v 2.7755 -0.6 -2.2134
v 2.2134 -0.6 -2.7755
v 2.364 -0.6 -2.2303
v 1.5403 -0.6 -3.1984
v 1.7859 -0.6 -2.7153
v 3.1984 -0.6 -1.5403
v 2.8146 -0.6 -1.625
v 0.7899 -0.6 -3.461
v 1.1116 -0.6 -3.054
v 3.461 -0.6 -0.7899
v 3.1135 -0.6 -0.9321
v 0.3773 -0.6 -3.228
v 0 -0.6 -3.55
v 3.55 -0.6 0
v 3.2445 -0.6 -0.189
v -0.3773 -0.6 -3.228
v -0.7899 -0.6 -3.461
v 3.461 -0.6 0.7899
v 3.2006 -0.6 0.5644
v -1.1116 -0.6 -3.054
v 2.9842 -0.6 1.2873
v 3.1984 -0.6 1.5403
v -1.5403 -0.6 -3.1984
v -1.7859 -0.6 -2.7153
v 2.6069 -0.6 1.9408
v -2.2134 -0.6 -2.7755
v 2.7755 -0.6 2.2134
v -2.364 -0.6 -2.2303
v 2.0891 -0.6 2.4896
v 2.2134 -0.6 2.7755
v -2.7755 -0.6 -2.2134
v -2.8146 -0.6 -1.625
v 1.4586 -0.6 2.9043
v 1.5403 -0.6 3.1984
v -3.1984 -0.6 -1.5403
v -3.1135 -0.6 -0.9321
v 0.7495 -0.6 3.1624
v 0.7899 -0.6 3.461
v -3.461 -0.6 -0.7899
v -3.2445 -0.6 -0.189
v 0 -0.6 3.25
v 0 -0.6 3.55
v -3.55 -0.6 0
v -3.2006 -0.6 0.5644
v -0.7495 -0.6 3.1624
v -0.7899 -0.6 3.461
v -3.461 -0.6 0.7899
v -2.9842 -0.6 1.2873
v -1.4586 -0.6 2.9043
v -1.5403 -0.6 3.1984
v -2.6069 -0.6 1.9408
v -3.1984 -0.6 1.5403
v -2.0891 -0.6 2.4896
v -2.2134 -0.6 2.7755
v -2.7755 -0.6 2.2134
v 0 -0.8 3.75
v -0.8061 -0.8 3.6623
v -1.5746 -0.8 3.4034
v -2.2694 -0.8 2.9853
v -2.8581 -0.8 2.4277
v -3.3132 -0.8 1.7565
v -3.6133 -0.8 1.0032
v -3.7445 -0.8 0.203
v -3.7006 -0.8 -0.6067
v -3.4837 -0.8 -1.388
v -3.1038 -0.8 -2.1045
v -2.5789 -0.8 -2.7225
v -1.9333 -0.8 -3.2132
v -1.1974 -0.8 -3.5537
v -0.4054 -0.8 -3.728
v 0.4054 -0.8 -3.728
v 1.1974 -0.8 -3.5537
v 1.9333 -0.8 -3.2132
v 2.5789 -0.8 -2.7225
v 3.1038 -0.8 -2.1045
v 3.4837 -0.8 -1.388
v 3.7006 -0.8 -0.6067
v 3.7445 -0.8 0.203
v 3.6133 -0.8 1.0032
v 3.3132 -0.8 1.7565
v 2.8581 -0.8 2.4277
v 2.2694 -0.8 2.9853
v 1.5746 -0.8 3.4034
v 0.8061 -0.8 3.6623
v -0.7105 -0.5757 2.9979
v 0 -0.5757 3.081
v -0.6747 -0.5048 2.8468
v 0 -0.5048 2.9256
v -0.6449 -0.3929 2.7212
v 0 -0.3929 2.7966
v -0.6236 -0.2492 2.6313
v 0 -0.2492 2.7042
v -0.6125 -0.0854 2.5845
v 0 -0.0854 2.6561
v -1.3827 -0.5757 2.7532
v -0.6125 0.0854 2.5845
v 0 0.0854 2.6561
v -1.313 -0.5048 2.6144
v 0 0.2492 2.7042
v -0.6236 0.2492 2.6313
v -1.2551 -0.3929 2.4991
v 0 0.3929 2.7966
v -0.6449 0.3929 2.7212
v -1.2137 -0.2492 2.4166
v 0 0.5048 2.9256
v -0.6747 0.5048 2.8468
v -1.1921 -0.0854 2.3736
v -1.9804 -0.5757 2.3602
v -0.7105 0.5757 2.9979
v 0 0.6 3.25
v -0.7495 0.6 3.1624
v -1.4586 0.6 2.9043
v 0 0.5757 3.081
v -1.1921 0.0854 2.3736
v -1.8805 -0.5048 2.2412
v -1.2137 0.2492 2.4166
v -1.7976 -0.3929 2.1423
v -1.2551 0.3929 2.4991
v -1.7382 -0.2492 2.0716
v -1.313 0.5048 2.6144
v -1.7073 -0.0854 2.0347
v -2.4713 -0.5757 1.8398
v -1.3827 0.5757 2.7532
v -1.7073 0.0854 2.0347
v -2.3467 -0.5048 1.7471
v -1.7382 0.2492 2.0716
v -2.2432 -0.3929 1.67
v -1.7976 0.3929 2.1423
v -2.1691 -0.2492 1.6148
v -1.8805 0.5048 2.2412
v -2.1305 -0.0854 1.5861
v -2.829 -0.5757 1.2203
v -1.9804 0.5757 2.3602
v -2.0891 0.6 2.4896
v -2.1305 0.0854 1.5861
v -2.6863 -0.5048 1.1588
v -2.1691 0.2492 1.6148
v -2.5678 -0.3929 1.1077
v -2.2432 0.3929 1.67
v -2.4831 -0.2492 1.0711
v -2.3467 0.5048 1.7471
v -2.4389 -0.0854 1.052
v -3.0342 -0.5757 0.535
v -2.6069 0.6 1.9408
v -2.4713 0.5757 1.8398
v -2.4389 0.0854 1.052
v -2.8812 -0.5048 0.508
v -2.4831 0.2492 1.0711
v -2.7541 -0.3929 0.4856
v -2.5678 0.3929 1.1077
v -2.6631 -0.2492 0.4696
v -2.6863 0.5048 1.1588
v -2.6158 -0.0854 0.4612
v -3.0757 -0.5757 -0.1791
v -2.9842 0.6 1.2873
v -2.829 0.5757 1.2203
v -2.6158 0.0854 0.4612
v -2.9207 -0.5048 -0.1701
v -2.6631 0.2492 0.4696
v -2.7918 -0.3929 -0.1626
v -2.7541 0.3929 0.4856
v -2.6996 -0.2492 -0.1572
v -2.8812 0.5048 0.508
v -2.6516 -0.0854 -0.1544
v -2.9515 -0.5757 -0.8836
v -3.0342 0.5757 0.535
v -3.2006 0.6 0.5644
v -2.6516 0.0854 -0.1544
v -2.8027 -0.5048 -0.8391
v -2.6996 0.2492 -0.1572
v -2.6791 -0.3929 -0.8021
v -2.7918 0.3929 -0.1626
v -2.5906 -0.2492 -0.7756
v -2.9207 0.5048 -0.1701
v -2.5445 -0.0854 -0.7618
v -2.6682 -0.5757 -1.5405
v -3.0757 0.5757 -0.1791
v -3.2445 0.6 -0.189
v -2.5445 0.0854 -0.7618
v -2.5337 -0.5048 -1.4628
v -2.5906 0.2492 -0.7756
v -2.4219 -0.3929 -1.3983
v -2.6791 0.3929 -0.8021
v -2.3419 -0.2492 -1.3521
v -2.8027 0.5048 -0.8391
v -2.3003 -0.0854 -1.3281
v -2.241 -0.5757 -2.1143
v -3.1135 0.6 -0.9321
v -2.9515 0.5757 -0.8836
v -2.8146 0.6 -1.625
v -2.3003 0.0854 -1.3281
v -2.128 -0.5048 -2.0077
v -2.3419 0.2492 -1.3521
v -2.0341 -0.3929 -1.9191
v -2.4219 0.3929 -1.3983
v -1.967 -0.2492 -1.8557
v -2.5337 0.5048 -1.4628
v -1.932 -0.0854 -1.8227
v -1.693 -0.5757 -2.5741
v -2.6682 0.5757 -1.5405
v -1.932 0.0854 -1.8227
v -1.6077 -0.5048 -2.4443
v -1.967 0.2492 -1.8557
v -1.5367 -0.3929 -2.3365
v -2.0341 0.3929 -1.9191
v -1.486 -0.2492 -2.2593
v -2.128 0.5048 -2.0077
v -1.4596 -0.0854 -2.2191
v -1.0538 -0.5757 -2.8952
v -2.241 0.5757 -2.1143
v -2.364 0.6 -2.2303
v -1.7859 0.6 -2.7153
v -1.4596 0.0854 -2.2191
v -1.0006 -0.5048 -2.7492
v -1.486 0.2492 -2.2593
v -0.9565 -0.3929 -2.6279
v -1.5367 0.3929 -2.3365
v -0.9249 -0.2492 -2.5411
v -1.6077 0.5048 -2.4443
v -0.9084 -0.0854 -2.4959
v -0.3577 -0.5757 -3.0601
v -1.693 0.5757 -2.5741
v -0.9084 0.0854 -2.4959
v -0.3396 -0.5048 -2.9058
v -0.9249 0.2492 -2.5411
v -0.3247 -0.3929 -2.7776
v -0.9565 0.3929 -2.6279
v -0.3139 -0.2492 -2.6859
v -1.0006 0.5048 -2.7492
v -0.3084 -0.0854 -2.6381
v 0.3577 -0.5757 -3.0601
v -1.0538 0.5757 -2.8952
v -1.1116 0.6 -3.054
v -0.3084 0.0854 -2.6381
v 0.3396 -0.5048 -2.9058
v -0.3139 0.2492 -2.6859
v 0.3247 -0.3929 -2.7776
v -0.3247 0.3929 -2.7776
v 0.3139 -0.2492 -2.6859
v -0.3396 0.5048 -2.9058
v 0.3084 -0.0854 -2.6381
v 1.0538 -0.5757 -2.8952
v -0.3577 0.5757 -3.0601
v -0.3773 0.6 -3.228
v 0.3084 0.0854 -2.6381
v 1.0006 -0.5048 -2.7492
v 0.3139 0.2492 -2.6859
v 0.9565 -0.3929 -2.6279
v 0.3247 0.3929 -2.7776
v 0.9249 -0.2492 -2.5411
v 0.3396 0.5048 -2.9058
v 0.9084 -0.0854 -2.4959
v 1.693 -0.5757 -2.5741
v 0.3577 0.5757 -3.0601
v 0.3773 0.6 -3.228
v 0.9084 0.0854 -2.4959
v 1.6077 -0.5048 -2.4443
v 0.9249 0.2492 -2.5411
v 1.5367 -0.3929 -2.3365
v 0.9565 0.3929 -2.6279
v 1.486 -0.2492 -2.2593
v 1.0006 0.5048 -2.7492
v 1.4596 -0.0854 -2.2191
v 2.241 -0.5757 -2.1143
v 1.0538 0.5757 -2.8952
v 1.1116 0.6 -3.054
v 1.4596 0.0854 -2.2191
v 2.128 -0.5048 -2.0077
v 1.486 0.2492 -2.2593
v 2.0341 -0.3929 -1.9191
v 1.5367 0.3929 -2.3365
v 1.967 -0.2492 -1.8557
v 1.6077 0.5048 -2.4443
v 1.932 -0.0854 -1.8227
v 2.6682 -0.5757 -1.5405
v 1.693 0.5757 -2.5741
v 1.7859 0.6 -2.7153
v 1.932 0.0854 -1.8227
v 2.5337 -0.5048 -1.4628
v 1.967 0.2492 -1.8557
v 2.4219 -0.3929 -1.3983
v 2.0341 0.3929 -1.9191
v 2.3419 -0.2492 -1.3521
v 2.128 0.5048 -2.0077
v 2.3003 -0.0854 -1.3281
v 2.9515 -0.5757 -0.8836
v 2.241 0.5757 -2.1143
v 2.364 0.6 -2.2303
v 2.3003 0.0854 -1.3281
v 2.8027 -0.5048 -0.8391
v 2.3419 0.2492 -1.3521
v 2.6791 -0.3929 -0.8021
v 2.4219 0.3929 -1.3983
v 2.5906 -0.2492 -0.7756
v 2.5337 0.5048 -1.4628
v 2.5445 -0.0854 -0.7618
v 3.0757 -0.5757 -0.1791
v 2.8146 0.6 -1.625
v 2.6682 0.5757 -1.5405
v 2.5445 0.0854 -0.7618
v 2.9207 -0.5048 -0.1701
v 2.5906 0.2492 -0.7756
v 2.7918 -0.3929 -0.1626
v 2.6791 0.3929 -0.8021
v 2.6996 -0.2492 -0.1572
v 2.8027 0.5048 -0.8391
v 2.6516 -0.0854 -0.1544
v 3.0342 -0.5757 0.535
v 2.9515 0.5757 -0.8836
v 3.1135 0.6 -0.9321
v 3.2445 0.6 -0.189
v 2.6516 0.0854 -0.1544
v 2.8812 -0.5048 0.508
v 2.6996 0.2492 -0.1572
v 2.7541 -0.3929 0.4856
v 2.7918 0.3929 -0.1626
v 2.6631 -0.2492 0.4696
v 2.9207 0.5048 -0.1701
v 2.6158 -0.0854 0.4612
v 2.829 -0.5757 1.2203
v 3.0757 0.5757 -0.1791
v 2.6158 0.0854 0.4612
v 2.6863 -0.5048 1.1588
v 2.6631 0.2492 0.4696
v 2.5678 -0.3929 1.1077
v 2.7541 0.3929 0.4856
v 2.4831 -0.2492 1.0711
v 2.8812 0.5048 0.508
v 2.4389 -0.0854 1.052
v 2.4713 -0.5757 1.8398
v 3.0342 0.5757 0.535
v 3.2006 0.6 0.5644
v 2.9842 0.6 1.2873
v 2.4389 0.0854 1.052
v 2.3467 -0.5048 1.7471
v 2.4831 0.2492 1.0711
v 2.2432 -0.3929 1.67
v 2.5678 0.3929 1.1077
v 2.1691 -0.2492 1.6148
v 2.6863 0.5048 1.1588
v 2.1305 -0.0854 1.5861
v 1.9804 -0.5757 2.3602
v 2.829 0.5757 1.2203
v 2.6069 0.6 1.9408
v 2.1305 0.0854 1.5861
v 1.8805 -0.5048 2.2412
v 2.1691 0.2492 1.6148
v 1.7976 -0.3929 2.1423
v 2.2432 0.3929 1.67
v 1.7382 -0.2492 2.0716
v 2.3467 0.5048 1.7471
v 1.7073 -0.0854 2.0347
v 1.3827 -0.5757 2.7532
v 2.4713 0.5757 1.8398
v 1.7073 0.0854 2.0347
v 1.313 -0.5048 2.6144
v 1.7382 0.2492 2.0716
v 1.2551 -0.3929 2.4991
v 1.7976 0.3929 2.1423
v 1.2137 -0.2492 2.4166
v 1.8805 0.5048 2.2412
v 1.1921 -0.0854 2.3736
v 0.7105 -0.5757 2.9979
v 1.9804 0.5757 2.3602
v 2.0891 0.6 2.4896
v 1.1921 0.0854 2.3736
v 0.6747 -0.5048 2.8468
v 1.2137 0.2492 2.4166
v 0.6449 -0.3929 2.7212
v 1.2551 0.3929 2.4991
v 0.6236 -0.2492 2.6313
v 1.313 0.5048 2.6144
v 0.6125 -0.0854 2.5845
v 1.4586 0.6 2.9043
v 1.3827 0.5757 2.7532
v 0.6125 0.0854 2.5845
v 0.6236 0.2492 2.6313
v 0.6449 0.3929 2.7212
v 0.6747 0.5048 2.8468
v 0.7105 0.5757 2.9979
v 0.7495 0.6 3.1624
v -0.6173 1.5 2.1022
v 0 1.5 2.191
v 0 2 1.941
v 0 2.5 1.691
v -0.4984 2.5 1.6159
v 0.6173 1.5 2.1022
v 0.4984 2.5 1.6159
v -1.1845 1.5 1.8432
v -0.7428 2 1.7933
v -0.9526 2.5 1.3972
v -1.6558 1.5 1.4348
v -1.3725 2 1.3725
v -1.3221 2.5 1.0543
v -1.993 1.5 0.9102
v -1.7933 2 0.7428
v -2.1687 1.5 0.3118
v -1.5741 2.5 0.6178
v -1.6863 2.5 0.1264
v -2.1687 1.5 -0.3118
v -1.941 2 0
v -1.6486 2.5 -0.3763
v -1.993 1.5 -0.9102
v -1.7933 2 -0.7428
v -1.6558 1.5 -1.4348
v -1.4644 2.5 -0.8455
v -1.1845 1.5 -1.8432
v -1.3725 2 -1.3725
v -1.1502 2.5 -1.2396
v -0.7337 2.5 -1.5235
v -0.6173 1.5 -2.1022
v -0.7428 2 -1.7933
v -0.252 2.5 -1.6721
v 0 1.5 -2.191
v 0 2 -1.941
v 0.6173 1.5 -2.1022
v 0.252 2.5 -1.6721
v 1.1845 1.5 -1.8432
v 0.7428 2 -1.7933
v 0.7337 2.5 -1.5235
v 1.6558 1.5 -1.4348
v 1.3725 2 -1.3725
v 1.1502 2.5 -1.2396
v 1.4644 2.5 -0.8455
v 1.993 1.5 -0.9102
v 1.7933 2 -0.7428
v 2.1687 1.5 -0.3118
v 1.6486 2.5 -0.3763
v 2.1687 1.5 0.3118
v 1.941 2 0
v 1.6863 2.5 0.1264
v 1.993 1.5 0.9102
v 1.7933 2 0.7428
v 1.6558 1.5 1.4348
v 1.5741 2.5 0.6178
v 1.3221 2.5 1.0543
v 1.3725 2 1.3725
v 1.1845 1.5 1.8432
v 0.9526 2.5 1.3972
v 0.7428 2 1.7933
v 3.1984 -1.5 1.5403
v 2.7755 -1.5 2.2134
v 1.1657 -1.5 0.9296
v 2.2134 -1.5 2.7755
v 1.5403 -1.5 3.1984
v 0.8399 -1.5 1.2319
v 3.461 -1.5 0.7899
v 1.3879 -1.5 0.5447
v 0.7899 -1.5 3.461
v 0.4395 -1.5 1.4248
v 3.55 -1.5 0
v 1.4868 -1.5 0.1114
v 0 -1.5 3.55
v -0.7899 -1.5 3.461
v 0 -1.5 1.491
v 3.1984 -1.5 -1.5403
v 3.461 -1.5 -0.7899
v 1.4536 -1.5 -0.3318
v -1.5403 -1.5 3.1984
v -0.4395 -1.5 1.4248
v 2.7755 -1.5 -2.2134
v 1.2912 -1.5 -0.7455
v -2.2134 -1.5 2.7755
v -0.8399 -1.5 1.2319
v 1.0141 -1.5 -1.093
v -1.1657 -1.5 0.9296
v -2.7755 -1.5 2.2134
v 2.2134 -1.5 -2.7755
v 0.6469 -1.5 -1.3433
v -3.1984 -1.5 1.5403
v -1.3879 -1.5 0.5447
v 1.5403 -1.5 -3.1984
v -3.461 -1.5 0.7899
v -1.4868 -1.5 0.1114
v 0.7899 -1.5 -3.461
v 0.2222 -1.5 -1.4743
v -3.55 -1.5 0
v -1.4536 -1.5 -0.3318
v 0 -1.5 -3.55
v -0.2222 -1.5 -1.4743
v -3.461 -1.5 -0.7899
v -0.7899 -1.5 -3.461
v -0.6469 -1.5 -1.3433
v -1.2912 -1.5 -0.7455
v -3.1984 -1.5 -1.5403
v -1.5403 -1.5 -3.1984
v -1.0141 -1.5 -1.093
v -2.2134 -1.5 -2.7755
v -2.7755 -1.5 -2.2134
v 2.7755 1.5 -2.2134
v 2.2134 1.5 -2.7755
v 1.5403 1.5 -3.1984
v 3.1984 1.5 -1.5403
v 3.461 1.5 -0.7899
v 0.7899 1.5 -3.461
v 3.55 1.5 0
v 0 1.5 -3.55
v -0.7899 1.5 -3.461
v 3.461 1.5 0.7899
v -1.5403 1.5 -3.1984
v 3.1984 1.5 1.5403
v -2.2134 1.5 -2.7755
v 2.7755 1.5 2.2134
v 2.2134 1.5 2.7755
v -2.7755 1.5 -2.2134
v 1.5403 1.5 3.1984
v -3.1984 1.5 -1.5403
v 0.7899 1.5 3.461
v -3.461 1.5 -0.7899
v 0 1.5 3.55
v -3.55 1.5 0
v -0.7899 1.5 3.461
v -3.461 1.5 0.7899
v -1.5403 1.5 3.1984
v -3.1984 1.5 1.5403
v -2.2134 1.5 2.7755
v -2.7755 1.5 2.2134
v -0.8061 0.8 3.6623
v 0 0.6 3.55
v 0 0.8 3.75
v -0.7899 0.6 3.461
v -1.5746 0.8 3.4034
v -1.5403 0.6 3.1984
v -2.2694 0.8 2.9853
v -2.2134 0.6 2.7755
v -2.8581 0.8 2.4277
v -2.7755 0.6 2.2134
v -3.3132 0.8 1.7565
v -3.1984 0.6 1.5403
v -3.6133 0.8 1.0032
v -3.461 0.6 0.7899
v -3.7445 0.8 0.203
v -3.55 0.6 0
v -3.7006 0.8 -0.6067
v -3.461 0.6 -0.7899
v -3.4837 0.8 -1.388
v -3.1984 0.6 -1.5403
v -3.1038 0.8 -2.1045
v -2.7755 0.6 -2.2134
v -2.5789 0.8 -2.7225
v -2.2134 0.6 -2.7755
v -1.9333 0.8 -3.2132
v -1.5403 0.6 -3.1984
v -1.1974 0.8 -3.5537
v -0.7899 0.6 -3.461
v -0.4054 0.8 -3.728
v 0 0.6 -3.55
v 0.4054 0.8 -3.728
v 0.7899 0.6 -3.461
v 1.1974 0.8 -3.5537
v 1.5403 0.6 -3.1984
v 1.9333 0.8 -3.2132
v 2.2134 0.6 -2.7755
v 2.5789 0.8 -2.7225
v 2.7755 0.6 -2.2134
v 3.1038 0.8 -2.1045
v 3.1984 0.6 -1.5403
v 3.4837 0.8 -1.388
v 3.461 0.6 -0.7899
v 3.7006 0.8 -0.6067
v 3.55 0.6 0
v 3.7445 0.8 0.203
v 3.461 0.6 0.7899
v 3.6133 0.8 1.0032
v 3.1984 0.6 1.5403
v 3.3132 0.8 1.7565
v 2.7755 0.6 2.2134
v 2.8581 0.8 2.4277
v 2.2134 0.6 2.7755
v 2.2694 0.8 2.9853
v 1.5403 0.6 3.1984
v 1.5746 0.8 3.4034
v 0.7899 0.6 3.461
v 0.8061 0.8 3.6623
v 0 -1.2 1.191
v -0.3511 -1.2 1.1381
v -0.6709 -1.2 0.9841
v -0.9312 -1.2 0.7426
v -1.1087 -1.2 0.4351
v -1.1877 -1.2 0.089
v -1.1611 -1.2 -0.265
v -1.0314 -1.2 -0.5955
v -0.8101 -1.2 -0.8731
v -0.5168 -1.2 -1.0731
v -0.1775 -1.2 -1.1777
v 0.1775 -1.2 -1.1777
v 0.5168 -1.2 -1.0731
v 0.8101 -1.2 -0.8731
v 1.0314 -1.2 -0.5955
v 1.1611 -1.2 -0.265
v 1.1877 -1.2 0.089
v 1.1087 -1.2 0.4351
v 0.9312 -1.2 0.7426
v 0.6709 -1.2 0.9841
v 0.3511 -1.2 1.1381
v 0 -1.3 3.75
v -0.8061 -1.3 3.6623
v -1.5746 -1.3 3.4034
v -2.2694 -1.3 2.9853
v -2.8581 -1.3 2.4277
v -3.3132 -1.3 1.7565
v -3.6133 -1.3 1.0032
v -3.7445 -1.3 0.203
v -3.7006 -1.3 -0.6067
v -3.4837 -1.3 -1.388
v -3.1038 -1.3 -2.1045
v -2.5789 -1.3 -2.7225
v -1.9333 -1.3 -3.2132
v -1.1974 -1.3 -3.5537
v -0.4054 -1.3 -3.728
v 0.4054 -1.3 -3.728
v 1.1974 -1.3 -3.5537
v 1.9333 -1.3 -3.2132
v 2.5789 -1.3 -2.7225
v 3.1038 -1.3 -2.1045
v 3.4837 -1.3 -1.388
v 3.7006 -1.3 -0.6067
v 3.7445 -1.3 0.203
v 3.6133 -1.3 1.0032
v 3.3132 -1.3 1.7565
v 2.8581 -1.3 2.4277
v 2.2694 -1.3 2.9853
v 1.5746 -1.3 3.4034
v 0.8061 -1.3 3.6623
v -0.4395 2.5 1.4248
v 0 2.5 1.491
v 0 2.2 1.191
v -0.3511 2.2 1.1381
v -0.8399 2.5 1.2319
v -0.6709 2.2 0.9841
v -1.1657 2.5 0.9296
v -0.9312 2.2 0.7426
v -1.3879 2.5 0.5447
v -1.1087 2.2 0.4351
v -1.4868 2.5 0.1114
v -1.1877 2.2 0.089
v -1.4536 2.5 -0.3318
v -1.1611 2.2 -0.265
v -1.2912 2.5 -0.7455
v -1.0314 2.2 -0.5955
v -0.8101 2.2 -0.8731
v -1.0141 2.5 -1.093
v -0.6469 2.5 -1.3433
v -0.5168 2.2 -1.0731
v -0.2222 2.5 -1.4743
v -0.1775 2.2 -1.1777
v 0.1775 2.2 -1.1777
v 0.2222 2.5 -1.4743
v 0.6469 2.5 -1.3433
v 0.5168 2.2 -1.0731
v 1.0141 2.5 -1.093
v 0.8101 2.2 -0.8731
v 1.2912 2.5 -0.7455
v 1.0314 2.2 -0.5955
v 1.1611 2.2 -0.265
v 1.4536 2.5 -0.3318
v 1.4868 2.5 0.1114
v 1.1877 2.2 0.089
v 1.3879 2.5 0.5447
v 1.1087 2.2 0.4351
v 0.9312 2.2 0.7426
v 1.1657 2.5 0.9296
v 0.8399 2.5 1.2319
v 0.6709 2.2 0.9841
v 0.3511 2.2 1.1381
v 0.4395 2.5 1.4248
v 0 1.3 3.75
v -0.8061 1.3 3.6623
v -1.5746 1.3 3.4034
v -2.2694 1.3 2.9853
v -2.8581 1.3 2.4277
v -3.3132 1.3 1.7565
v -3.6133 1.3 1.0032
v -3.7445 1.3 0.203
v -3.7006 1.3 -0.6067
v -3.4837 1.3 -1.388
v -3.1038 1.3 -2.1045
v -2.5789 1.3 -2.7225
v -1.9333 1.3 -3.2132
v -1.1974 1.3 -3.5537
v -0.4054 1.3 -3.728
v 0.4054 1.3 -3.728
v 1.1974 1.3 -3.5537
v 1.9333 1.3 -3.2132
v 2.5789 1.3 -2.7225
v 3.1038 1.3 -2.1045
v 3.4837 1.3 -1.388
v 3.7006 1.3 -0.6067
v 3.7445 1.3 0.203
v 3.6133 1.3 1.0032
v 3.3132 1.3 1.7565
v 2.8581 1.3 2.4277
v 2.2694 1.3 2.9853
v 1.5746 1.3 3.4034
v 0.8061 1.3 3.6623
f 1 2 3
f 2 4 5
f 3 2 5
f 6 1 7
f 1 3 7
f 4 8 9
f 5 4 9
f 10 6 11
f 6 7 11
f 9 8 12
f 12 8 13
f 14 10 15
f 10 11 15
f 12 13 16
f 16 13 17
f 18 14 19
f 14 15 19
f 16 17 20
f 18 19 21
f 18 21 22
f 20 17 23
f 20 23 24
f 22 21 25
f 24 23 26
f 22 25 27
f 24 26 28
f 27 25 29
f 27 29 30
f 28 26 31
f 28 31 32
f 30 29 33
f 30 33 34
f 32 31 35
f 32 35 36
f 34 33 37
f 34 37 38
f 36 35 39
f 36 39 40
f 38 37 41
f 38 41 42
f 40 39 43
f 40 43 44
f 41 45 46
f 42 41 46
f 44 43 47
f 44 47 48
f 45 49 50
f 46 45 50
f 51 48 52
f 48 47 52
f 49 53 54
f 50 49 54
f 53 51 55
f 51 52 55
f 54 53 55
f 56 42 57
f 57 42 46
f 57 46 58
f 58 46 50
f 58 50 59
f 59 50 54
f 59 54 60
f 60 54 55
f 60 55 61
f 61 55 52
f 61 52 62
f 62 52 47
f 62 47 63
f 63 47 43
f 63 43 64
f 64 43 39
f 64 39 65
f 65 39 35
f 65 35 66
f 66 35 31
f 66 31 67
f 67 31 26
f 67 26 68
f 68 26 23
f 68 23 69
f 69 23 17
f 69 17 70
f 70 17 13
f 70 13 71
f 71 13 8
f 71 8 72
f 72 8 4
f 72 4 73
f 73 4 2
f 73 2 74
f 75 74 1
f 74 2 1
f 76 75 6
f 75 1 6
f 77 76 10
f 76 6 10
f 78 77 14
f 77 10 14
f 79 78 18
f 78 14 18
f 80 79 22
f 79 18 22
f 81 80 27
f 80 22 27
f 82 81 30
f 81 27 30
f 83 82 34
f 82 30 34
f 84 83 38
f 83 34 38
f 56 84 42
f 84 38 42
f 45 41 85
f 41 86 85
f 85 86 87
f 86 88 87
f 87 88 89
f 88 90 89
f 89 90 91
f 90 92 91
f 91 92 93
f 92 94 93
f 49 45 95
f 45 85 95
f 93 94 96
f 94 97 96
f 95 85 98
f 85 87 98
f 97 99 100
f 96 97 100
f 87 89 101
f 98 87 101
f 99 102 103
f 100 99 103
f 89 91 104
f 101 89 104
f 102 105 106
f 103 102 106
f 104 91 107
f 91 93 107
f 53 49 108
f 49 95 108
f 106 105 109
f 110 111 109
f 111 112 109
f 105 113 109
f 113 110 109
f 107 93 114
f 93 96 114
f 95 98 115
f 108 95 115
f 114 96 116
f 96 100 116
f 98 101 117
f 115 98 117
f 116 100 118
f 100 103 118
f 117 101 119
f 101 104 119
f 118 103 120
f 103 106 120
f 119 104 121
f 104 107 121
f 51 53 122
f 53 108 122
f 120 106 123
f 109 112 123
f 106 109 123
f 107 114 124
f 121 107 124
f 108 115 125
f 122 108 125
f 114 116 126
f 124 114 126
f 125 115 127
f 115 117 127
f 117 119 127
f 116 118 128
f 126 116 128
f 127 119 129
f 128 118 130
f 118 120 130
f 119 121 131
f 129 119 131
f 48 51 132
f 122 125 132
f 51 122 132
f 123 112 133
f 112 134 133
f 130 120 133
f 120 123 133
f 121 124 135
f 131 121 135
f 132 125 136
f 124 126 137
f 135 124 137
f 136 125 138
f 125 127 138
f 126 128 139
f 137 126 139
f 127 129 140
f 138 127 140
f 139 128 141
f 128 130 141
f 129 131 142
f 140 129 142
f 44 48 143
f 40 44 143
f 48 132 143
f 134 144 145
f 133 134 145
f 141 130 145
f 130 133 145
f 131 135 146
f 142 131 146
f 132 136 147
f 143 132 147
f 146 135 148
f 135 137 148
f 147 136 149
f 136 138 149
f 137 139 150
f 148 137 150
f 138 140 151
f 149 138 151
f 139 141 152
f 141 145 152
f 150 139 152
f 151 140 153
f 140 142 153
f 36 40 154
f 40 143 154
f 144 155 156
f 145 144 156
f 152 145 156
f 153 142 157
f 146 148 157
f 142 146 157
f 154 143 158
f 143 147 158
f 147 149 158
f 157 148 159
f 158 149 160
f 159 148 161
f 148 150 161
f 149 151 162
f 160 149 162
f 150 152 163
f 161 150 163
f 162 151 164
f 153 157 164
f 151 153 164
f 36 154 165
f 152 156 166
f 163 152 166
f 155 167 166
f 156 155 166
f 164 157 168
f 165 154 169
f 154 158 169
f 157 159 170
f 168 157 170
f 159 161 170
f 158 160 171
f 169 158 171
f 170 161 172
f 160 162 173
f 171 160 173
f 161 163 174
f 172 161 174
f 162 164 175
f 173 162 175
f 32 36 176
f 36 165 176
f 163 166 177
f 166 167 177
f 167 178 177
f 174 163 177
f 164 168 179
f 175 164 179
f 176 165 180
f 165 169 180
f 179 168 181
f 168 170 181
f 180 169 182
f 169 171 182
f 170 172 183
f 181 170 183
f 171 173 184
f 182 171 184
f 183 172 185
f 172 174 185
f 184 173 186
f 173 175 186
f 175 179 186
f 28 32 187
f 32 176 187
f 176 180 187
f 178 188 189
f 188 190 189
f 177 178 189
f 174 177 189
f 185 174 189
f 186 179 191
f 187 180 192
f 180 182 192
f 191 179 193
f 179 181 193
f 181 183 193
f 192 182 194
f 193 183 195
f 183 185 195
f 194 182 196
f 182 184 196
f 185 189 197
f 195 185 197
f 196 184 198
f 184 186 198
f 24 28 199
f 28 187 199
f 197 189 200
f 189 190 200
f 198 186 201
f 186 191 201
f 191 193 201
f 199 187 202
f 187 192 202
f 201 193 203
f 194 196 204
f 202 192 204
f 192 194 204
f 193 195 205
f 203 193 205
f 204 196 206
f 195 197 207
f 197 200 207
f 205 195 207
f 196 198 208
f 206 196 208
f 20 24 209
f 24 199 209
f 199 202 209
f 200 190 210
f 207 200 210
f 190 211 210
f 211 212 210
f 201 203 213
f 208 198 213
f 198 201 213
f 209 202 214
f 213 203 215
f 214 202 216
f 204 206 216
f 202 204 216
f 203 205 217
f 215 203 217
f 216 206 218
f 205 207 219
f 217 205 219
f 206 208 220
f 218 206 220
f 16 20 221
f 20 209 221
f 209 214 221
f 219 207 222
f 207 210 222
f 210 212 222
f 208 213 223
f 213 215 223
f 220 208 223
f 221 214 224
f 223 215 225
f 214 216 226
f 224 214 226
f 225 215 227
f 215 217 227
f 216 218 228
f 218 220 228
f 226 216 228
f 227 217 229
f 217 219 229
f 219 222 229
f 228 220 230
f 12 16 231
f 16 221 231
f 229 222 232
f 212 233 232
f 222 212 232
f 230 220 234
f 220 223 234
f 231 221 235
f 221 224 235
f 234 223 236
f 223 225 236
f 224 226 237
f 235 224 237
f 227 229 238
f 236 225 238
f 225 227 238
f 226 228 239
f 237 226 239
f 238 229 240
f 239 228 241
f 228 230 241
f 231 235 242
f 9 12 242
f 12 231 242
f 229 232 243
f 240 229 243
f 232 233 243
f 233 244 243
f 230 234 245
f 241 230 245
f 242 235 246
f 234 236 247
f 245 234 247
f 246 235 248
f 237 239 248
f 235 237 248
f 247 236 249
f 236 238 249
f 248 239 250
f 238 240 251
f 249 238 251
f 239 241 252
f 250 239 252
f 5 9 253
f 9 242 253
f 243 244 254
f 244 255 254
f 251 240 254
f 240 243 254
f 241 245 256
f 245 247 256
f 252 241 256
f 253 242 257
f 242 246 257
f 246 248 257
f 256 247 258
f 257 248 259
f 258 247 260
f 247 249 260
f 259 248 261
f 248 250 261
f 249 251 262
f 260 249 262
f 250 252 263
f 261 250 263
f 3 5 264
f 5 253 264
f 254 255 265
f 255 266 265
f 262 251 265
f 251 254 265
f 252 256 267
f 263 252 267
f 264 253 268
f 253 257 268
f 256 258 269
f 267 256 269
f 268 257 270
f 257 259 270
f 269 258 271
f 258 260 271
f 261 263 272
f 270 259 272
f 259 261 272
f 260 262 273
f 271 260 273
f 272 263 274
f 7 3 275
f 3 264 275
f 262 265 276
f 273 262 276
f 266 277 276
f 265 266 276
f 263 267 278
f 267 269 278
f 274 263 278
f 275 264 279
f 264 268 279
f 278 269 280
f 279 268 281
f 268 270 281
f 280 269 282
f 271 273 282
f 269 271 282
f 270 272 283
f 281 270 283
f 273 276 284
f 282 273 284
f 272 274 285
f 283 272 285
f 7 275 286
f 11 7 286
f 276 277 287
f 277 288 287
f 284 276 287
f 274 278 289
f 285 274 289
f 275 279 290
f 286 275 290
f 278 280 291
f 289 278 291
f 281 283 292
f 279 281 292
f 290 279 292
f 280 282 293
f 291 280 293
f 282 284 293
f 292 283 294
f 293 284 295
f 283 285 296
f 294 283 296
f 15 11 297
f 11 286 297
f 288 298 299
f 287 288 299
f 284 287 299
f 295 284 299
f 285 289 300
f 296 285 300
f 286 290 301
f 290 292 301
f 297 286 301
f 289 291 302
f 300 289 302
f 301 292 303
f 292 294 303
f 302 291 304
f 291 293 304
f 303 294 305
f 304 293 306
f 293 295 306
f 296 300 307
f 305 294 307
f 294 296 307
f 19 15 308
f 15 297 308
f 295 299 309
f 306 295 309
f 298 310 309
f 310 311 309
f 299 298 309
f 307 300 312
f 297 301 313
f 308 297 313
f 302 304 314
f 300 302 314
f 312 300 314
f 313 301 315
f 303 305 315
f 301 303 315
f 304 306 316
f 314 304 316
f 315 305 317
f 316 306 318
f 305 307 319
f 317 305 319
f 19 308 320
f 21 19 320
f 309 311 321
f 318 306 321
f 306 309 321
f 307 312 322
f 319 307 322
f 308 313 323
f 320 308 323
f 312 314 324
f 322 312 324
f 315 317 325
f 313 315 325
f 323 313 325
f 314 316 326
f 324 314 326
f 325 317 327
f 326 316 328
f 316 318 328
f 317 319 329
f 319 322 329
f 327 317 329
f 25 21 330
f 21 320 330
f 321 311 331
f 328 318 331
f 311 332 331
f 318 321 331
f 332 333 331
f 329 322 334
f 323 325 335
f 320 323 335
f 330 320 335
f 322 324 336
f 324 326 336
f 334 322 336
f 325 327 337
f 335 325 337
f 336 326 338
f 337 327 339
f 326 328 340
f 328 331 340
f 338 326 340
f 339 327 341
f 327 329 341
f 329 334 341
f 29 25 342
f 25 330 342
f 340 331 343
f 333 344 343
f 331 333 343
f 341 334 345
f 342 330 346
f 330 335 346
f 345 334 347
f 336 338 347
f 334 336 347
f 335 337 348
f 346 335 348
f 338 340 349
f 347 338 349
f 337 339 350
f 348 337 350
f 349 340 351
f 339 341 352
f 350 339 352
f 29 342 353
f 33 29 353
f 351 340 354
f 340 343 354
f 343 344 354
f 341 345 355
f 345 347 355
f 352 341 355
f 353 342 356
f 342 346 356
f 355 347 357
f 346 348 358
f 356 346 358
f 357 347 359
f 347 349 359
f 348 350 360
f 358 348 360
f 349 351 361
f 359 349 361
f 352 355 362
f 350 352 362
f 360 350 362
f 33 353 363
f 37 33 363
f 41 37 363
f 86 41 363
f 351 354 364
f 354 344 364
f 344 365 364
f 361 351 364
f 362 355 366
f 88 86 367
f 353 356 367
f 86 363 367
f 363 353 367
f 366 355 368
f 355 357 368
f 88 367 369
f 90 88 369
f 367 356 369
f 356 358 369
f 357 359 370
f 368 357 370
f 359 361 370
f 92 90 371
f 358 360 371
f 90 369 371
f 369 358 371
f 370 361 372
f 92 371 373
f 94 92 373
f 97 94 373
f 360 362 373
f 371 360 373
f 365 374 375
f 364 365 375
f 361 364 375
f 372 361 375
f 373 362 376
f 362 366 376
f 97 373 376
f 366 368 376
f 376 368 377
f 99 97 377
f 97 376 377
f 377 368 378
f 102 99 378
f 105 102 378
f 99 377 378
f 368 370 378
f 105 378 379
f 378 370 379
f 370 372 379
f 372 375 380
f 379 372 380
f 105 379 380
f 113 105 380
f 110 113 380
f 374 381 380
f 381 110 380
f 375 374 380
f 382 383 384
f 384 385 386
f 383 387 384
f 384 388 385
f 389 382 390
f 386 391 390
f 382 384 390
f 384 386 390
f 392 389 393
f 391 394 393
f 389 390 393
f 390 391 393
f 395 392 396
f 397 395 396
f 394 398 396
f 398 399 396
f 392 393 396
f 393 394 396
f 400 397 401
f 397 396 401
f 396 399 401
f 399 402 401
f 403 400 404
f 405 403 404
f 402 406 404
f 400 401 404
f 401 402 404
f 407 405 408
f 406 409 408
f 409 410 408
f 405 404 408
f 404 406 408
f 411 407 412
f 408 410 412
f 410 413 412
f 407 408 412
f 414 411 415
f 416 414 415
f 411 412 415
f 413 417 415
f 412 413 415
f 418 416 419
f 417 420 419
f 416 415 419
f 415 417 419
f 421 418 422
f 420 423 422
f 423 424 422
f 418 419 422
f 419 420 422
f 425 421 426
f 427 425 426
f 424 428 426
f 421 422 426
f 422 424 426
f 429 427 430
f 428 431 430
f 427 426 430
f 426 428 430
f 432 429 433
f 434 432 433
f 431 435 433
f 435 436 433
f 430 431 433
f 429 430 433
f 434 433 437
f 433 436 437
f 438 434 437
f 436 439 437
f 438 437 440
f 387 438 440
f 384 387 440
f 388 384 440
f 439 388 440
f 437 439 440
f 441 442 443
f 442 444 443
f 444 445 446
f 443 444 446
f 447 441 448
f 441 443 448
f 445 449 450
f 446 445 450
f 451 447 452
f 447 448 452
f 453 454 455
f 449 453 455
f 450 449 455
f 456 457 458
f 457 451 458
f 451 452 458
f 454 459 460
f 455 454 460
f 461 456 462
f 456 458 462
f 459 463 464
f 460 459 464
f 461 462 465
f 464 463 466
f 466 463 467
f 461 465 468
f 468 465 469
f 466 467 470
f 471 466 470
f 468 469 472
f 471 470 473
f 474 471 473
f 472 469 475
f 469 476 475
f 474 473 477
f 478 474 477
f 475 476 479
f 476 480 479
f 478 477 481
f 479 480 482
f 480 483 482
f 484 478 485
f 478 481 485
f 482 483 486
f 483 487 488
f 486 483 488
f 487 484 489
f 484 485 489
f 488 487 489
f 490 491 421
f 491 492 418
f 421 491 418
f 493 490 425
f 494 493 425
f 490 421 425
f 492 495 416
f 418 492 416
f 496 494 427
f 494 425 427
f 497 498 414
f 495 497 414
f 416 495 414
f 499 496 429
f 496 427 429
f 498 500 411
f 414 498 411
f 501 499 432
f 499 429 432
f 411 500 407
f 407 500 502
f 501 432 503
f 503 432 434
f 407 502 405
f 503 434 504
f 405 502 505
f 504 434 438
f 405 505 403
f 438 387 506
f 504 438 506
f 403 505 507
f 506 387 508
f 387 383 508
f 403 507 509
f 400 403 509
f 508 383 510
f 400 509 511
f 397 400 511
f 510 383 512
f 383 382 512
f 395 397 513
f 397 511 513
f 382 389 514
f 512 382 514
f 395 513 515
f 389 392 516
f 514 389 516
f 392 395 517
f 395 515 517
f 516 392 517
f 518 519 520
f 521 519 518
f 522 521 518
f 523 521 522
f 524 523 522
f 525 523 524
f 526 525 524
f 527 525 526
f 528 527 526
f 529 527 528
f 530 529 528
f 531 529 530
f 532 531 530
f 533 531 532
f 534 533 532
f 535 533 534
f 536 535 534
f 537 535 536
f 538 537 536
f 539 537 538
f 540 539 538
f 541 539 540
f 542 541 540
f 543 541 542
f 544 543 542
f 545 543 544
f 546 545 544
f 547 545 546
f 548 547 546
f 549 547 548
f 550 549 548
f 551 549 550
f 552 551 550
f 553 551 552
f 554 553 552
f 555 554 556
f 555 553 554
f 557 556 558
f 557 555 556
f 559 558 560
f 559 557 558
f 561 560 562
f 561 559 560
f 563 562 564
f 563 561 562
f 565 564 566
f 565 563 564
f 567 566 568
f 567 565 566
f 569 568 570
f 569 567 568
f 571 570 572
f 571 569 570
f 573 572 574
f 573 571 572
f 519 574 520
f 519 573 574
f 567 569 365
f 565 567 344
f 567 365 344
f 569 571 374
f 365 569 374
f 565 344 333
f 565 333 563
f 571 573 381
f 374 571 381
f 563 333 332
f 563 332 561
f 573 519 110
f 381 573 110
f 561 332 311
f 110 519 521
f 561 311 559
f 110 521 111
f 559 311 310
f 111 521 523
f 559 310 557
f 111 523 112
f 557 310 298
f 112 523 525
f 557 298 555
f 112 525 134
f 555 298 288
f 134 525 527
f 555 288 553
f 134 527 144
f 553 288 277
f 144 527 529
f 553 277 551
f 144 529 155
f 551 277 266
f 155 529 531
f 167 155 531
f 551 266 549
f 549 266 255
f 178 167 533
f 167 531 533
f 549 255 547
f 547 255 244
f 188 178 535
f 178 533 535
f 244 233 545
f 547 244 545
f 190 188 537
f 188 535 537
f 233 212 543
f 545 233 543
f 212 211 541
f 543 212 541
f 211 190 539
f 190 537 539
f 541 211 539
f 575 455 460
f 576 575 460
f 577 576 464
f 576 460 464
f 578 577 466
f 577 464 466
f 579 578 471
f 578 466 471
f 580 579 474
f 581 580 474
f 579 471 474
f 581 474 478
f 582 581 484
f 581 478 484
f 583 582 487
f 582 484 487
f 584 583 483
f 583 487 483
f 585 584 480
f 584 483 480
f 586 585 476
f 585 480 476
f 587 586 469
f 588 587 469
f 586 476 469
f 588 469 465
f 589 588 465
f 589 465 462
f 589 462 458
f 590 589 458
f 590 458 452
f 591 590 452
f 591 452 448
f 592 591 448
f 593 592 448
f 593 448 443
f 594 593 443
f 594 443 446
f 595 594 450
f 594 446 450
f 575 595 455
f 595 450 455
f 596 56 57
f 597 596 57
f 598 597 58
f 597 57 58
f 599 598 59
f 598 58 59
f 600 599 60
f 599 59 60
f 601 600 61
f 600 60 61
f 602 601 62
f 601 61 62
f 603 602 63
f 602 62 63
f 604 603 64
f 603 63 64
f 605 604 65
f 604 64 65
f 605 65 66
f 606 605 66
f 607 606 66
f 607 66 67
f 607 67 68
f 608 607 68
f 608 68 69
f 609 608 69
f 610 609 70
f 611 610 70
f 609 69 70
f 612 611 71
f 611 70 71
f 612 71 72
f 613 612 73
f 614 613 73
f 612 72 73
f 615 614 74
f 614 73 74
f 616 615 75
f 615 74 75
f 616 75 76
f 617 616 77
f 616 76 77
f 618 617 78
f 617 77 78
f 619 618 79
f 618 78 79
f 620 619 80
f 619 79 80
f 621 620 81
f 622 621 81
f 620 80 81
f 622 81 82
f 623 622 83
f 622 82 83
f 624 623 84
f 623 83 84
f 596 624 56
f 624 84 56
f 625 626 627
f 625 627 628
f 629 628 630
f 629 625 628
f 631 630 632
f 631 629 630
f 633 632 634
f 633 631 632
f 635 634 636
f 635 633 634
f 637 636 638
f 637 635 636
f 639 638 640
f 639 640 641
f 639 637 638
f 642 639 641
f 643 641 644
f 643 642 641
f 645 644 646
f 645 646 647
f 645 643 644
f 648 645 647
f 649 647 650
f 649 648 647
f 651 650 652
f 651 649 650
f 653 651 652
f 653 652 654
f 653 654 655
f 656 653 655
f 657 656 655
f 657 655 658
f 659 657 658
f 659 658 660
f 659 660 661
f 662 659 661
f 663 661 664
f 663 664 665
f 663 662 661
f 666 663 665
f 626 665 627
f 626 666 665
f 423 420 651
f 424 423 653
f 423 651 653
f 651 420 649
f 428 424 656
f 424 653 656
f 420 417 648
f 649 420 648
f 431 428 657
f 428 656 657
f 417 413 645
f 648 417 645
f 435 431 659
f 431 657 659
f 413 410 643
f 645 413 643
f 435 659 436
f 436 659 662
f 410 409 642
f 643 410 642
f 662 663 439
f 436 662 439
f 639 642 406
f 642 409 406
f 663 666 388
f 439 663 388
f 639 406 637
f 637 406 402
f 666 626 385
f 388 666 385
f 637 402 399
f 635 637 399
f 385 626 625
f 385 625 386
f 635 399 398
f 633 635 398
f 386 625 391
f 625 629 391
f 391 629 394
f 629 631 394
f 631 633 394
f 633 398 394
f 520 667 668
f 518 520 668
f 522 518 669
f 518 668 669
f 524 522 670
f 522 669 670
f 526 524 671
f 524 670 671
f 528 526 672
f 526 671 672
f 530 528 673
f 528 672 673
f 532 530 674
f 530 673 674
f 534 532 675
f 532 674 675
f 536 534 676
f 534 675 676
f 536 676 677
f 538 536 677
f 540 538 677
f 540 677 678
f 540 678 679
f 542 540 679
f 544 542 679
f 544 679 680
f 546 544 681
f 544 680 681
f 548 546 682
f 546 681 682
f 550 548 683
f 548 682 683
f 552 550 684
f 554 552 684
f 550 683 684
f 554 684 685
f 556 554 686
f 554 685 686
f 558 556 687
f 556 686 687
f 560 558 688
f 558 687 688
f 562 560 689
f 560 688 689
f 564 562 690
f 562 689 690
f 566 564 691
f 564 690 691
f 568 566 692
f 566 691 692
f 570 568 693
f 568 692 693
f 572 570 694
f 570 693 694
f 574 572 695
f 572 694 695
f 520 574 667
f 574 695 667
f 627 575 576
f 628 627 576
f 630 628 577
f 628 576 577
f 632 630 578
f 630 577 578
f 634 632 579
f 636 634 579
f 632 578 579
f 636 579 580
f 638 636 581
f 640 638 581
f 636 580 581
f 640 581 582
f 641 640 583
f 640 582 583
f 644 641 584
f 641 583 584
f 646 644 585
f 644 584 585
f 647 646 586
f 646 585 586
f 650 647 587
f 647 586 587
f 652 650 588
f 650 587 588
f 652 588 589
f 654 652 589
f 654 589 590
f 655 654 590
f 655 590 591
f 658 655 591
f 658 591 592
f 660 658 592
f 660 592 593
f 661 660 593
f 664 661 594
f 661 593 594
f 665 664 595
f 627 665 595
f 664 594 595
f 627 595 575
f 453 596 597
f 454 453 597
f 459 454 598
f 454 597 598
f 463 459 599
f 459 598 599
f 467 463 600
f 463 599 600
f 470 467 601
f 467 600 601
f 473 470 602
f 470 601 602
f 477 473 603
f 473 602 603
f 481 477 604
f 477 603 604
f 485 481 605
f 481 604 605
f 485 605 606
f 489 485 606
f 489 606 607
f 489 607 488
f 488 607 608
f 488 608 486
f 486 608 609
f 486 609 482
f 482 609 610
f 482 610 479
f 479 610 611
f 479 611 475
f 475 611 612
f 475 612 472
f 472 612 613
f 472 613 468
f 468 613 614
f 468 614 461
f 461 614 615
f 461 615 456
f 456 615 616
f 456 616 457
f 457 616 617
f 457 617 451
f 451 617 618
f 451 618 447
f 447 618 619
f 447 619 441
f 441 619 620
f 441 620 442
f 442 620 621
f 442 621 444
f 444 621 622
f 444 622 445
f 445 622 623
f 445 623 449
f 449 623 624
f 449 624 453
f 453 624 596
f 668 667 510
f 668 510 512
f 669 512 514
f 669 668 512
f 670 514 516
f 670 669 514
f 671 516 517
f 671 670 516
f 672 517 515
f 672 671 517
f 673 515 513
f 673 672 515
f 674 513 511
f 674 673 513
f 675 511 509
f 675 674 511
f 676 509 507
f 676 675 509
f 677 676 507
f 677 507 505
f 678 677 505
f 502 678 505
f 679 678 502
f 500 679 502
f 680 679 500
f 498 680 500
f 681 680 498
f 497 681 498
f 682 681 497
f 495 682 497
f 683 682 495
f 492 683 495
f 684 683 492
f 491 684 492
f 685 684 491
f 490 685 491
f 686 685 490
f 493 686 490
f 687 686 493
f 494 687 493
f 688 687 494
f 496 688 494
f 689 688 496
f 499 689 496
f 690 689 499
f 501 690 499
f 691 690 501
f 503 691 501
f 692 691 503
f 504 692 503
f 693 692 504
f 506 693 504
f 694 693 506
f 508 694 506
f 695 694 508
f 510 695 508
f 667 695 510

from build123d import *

# Parameters (mm, degrees)
CHAMFER1_SIZE = 0.3
CHAMFER2_SIZE = 0.2


with BuildPart() as part:
    # Sketch1 → Revolve1 (revolve)
    with BuildSketch(Plane(origin=(0, 0, 0), x_dir=(0, 0, -1), z_dir=(1, 0, 0)), mode=Mode.PRIVATE) as revolve1_sk:
        with BuildLine():
            Line((1.191, 2.5), (1.191, -1.5))
            Line((1.191, -1.5), (2.191, -1.5))
            Line((2.191, -1.5), (3.75, -1.5))
            Line((3.75, -1.5), (3.75, -0.6))
            Line((3.75, -0.6), (3.25, -0.6))
            ThreePointArc((3.25, -0.6), (2.65, 0), (3.25, 0.6))
            Line((3.25, 0.6), (3.75, 0.6))
            Line((3.75, 0.6), (3.75, 1.5))
            Line((3.75, 1.5), (2.191, 1.5))
            Line((2.191, 1.5), (1.691, 2.5))
            Line((1.691, 2.5), (1.191, 2.5))
        make_face()
    revolve(revolve1_sk.sketch.rotate(Axis((0, 2.7, 0), (0, -1, 0)), 180), axis=Axis((0, 2.7, 0), (0, -1, 0)))

    # Chamfer1
    chamfer1_edges = [part.edges().sort_by_distance(p)[0] for p in [
        (0, -1.5, -1.191),
        (0, 2.5, -1.191),
    ]]
    chamfer(chamfer1_edges, length=CHAMFER1_SIZE)

    # Chamfer2
    chamfer2_edges = [part.edges().sort_by_distance(p)[0] for p in [
        (0, 1.5, -3.75),
        (0, 0.6, -3.75),
        (0, -0.6, -3.75),
        (0, -1.5, -3.75),
    ]]
    chamfer(chamfer2_edges, length=CHAMFER2_SIZE)


solid = part.part
